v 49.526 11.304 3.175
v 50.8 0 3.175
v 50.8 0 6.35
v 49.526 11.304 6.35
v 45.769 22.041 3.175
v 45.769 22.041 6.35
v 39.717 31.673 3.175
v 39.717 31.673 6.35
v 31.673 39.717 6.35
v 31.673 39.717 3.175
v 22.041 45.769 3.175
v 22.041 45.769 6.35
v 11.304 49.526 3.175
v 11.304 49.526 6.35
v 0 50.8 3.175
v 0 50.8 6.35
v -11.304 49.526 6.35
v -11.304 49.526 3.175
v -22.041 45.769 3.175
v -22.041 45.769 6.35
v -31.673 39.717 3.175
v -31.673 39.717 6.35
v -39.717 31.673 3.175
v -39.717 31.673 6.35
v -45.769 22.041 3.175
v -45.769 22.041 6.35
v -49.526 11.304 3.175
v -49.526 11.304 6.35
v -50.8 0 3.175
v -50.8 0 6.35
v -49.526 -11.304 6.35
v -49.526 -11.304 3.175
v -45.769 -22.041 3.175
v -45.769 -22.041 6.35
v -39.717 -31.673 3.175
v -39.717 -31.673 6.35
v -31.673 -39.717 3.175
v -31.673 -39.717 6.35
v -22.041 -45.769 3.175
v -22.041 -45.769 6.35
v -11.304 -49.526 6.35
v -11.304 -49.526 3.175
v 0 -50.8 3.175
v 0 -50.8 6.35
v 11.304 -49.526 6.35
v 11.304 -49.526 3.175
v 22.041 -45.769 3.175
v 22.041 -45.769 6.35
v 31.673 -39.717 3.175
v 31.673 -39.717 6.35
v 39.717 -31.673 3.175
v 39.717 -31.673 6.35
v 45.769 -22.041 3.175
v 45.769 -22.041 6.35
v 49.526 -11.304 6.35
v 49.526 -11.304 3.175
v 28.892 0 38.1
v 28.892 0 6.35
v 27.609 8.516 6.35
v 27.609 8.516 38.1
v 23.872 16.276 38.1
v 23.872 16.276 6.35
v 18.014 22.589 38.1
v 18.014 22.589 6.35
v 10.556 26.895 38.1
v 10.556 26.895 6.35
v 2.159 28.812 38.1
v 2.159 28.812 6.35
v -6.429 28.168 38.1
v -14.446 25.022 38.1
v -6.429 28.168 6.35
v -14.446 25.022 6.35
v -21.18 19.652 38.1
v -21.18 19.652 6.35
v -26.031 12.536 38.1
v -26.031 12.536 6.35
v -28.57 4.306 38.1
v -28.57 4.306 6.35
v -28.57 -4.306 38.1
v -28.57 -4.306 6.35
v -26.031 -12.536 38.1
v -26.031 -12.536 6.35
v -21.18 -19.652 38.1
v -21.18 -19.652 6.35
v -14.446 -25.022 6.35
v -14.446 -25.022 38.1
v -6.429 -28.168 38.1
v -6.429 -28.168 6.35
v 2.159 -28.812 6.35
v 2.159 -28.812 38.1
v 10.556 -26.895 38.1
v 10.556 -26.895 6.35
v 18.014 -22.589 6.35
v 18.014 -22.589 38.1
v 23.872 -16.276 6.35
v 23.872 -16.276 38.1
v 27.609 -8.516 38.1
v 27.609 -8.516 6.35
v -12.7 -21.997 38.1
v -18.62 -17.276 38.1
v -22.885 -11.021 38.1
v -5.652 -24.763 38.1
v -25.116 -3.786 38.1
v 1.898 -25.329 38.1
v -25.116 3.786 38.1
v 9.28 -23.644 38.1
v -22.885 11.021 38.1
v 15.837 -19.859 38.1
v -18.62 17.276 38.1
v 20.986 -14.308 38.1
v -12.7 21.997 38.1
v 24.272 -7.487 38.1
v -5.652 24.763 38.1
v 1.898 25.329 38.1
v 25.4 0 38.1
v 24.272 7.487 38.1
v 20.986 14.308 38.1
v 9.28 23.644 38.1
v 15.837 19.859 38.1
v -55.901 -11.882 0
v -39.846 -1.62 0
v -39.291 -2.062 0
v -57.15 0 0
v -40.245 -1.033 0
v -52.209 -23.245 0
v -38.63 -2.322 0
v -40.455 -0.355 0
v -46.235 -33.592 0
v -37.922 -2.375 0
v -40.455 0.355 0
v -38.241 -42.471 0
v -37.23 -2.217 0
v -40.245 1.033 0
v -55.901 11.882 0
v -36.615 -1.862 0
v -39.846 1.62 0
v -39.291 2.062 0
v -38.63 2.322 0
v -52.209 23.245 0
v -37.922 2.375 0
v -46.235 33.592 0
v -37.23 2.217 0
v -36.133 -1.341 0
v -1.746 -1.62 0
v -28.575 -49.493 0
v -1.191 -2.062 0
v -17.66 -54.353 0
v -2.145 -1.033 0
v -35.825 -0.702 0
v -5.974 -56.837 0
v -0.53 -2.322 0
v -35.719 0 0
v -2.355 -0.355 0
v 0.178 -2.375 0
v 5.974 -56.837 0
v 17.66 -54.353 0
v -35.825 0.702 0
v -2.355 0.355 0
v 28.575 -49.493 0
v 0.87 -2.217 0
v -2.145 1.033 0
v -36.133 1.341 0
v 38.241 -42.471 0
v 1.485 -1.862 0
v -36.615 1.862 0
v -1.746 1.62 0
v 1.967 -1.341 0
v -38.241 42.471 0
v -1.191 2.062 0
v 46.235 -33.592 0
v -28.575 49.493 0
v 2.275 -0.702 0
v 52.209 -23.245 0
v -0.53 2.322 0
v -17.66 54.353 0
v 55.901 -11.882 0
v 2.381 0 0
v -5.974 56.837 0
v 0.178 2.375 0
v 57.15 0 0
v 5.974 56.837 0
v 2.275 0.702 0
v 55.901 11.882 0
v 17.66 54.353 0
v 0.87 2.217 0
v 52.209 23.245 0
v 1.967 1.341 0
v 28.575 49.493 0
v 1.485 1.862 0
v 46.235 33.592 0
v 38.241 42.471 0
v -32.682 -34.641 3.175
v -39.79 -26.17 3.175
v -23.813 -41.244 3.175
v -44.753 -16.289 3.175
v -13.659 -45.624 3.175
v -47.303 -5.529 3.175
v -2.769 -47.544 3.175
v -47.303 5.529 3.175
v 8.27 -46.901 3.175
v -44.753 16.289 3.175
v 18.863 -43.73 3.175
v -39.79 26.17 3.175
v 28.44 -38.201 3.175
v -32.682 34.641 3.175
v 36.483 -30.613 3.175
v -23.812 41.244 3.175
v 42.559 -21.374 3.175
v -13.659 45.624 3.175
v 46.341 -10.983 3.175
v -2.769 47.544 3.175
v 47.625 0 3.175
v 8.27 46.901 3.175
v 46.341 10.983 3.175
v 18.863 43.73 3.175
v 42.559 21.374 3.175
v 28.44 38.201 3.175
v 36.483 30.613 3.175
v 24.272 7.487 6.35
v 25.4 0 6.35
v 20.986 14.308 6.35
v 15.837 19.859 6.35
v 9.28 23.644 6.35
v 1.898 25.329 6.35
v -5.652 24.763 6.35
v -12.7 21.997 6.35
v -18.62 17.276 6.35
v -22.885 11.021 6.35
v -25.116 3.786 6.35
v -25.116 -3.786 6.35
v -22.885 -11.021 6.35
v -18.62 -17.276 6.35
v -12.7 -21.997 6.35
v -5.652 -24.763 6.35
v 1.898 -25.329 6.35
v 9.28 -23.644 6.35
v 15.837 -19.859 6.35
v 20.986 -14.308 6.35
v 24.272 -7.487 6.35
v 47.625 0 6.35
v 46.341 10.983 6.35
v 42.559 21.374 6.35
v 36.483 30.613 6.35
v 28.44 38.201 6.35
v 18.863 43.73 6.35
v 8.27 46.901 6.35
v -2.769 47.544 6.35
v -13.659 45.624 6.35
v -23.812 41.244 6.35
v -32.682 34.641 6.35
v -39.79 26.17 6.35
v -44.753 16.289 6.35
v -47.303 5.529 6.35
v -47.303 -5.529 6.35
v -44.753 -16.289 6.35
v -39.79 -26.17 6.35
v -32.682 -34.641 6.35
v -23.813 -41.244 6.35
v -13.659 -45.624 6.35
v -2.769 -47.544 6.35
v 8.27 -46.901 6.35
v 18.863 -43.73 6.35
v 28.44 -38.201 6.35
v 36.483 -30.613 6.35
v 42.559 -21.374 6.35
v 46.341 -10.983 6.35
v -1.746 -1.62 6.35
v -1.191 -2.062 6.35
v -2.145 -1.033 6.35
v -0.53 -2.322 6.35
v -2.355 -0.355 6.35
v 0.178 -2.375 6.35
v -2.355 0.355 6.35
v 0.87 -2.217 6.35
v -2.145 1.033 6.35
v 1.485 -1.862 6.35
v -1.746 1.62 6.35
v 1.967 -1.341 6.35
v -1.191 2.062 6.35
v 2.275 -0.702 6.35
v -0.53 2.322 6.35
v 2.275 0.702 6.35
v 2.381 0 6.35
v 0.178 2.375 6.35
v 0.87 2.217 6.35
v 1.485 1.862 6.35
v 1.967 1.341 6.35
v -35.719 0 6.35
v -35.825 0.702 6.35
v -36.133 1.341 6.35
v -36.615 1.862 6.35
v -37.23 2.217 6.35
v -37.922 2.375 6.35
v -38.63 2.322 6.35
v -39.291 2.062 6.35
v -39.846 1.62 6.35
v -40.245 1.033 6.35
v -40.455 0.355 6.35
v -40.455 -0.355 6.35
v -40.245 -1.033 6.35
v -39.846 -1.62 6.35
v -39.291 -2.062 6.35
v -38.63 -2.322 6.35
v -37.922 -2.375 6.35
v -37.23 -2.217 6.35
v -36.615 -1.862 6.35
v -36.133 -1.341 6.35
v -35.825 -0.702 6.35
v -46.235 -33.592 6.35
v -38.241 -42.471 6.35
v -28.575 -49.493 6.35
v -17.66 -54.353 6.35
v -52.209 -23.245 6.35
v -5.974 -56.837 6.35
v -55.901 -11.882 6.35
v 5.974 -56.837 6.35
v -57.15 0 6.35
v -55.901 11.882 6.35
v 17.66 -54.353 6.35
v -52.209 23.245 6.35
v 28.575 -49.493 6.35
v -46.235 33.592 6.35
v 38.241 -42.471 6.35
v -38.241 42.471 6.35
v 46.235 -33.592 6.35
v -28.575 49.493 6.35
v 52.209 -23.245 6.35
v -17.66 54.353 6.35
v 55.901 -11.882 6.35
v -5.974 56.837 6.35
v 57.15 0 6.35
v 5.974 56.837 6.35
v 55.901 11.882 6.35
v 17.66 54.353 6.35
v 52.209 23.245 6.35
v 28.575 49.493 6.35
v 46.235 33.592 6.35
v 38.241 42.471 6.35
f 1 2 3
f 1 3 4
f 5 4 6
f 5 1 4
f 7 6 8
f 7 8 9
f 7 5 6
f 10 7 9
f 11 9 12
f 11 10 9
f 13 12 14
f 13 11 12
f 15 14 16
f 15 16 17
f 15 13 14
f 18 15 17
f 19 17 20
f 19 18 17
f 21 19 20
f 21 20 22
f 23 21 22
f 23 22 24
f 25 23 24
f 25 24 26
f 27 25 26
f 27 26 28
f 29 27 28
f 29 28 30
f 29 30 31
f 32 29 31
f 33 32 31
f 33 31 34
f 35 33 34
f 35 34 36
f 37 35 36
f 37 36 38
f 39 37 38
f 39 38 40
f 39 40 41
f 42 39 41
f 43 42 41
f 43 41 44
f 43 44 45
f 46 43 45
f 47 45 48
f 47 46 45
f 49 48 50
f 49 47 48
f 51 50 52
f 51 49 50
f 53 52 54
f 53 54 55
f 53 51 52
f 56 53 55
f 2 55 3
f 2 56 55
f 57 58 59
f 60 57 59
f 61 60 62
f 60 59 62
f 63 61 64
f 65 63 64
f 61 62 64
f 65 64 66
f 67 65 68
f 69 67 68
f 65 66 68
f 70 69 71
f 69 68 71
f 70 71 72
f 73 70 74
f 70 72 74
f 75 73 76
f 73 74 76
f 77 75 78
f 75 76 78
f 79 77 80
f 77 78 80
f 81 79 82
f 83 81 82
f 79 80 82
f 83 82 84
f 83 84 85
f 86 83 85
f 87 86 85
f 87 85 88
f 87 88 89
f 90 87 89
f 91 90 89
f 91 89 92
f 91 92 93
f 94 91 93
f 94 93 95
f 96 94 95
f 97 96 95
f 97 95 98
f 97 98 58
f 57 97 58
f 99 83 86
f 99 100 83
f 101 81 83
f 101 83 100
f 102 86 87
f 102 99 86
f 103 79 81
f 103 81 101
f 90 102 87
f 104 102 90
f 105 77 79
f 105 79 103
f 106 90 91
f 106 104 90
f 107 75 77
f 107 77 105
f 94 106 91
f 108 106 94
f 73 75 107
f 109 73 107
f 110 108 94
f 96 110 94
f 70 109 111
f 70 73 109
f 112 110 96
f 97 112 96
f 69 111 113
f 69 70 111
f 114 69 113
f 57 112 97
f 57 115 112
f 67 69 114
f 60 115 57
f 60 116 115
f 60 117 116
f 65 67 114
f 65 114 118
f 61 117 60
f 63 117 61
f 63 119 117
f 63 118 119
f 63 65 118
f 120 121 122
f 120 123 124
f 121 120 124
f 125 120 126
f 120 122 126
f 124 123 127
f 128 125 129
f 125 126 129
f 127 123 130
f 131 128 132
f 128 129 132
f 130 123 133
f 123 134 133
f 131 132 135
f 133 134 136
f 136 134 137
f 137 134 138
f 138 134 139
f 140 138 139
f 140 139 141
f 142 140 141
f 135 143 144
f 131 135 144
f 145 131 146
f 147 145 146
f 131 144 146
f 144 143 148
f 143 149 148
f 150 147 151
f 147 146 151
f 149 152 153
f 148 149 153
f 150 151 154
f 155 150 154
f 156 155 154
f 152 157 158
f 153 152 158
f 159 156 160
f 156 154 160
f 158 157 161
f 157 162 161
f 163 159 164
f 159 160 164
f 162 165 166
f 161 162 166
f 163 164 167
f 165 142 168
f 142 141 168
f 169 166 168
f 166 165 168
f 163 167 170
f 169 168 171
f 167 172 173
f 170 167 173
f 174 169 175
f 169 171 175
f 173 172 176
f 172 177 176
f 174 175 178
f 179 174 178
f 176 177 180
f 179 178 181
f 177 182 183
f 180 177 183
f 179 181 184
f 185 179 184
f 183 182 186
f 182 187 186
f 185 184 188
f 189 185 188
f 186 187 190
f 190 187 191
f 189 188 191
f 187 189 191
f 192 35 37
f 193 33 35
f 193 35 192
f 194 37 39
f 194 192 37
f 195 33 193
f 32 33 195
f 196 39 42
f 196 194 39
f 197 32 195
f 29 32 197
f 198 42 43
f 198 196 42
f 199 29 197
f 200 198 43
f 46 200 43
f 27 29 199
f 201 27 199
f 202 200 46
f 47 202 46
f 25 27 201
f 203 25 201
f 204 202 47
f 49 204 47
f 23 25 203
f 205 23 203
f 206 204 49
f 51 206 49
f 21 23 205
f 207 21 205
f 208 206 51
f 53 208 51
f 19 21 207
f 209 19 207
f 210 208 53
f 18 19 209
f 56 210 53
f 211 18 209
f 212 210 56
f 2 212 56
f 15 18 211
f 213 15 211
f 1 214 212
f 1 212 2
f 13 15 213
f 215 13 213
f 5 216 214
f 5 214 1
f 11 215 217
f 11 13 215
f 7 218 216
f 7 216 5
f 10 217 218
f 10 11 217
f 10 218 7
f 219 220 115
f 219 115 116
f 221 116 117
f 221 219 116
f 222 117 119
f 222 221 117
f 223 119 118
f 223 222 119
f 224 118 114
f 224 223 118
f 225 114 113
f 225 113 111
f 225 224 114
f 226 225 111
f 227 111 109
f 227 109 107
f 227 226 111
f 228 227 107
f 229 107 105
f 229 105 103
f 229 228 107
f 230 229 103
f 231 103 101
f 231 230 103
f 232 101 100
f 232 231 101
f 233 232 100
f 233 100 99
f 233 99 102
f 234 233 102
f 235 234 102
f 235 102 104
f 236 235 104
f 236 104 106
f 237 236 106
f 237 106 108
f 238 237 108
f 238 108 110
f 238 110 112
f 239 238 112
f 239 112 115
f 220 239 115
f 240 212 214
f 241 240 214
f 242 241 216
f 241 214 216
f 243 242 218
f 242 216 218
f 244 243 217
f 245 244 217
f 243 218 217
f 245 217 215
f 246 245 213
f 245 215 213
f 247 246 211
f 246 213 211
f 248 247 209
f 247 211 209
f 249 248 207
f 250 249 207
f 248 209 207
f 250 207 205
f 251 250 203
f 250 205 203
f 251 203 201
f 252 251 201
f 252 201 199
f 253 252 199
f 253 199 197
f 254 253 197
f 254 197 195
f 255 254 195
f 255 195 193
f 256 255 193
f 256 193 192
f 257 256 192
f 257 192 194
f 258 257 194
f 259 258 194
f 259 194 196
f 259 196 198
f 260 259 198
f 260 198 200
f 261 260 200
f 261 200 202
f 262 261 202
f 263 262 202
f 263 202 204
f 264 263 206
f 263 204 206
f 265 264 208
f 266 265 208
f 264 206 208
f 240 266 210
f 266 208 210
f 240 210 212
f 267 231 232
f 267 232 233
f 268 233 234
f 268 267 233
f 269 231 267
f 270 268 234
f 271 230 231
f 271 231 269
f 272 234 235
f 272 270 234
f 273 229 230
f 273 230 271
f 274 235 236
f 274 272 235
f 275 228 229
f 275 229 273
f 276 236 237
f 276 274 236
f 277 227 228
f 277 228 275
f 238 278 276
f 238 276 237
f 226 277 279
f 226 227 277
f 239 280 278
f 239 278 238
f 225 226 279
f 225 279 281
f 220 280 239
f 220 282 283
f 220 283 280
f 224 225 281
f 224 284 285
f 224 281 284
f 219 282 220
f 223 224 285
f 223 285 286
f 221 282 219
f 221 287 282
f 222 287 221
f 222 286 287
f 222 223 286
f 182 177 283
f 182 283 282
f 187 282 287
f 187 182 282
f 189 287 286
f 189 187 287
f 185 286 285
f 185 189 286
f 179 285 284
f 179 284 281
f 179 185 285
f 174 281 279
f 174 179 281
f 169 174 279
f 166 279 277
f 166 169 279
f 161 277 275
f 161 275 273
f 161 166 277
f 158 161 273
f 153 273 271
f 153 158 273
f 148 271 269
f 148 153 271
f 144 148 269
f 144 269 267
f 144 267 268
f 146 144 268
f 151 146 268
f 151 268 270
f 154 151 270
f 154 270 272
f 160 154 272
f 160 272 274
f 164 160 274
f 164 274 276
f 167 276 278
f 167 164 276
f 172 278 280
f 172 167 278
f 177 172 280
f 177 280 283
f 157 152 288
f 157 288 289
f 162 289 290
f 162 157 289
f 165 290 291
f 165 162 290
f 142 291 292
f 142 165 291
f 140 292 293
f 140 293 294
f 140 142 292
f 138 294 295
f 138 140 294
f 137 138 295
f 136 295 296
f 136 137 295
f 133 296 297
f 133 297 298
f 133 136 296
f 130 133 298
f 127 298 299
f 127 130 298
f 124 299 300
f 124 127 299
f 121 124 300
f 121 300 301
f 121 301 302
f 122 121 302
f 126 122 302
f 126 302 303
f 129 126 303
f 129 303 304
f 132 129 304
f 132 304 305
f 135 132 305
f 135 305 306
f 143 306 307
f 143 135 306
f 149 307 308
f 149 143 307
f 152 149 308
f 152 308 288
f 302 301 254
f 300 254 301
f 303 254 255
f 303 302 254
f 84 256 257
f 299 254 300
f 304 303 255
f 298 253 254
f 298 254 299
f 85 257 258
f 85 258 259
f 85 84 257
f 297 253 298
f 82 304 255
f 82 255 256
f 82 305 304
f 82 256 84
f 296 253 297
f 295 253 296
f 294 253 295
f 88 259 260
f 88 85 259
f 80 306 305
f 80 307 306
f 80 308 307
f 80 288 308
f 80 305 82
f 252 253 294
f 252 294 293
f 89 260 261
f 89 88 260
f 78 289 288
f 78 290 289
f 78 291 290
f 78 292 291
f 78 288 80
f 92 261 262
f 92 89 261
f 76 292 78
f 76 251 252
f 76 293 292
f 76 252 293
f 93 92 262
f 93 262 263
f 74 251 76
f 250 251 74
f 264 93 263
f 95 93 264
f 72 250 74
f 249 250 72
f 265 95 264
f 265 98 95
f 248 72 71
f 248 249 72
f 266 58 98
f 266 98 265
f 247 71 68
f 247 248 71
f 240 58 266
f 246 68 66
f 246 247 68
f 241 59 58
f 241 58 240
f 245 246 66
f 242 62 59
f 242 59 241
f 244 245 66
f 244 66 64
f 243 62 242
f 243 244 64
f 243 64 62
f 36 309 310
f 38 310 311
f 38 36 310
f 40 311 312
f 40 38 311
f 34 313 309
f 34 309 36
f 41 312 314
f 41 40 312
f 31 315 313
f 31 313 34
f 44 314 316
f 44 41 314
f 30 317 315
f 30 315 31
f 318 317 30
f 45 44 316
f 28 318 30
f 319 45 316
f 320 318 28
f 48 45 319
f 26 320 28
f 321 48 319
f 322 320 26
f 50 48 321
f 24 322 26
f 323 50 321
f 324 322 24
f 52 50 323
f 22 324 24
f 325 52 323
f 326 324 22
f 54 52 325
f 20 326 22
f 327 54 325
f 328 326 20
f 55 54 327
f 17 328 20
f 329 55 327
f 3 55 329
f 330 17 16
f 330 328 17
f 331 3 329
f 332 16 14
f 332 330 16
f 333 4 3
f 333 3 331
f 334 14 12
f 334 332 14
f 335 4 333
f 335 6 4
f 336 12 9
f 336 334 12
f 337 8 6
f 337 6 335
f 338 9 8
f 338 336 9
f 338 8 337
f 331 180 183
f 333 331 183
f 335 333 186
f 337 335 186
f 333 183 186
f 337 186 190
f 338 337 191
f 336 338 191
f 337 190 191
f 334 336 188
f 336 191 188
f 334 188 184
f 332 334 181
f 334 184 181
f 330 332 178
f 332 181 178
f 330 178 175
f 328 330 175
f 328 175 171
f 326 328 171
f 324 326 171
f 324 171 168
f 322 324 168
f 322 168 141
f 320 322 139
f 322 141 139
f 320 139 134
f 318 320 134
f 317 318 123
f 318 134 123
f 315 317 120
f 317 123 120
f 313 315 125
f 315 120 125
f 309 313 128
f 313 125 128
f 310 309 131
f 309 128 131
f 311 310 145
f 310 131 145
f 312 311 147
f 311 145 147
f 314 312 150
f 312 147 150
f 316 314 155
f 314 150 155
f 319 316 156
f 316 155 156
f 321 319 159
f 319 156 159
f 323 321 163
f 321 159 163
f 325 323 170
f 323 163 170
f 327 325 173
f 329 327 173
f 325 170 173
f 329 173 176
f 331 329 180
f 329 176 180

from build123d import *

# Parameters (mm, degrees)
SKETCH1_R        = 57.15
SKETCH1_R_2      = 50.8
EXTRUDE3_DEPTH   = 6.35
SKETCH1_R_3      = 47.625
SKETCH1_R_4      = 28.8925
SKETCH1_R_5      = 2.38125
EXTRUDE3_2_DEPTH = 6.35
SKETCH1_R_6      = 25.4
EXTRUDE3_3_DEPTH = 6.35
SKETCH1_8_R      = 50.8
SKETCH1_8_R_2    = 47.625
EXTRUDE4_DEPTH   = 3.175
SKETCH1_9_R      = 28.8925
SKETCH1_9_R_2    = 25.4
EXTRUDE5_DEPTH   = 38.1


with BuildPart() as part:
    # Sketch1 → Extrude3 (new body)
    with BuildSketch(Plane.XY):
        Circle(SKETCH1_R)
        Circle(SKETCH1_R_2, mode=Mode.SUBTRACT)
    extrude(amount=EXTRUDE3_DEPTH)



with BuildPart() as body_2:
    # Sketch1 → Extrude3 2 (new body)
    with BuildSketch(Plane.XY):
        Circle(SKETCH1_R_3)
        Circle(SKETCH1_R_4, mode=Mode.SUBTRACT)
        with Locations((-38.1, 0)):
            Circle(SKETCH1_R_5, mode=Mode.SUBTRACT)
    extrude(amount=EXTRUDE3_2_DEPTH)


with BuildPart() as body_3:
    # Sketch1 → Extrude3 3 (new body)
    with BuildSketch(Plane.XY):
        Circle(SKETCH1_R_6)
        Circle(SKETCH1_R_5, mode=Mode.SUBTRACT)
    extrude(amount=EXTRUDE3_3_DEPTH)


with BuildPart() as part_1:
    add(part.part)

    add(body_2.part)  # Extrude4 merges body 2
    # Sketch1_8 → Extrude4 (add)
    with BuildSketch(Plane.XY):
        Circle(SKETCH1_8_R)
        Circle(SKETCH1_8_R_2, mode=Mode.SUBTRACT)
    extrude(amount=EXTRUDE4_DEPTH)


    add(body_3.part)  # Extrude5 merges body 3
    # Sketch1_9 → Extrude5 (add)
    with BuildSketch(Plane.XY):
        Circle(SKETCH1_9_R)
        Circle(SKETCH1_9_R_2, mode=Mode.SUBTRACT)
    extrude(amount=EXTRUDE5_DEPTH)


solid = part_1.part
